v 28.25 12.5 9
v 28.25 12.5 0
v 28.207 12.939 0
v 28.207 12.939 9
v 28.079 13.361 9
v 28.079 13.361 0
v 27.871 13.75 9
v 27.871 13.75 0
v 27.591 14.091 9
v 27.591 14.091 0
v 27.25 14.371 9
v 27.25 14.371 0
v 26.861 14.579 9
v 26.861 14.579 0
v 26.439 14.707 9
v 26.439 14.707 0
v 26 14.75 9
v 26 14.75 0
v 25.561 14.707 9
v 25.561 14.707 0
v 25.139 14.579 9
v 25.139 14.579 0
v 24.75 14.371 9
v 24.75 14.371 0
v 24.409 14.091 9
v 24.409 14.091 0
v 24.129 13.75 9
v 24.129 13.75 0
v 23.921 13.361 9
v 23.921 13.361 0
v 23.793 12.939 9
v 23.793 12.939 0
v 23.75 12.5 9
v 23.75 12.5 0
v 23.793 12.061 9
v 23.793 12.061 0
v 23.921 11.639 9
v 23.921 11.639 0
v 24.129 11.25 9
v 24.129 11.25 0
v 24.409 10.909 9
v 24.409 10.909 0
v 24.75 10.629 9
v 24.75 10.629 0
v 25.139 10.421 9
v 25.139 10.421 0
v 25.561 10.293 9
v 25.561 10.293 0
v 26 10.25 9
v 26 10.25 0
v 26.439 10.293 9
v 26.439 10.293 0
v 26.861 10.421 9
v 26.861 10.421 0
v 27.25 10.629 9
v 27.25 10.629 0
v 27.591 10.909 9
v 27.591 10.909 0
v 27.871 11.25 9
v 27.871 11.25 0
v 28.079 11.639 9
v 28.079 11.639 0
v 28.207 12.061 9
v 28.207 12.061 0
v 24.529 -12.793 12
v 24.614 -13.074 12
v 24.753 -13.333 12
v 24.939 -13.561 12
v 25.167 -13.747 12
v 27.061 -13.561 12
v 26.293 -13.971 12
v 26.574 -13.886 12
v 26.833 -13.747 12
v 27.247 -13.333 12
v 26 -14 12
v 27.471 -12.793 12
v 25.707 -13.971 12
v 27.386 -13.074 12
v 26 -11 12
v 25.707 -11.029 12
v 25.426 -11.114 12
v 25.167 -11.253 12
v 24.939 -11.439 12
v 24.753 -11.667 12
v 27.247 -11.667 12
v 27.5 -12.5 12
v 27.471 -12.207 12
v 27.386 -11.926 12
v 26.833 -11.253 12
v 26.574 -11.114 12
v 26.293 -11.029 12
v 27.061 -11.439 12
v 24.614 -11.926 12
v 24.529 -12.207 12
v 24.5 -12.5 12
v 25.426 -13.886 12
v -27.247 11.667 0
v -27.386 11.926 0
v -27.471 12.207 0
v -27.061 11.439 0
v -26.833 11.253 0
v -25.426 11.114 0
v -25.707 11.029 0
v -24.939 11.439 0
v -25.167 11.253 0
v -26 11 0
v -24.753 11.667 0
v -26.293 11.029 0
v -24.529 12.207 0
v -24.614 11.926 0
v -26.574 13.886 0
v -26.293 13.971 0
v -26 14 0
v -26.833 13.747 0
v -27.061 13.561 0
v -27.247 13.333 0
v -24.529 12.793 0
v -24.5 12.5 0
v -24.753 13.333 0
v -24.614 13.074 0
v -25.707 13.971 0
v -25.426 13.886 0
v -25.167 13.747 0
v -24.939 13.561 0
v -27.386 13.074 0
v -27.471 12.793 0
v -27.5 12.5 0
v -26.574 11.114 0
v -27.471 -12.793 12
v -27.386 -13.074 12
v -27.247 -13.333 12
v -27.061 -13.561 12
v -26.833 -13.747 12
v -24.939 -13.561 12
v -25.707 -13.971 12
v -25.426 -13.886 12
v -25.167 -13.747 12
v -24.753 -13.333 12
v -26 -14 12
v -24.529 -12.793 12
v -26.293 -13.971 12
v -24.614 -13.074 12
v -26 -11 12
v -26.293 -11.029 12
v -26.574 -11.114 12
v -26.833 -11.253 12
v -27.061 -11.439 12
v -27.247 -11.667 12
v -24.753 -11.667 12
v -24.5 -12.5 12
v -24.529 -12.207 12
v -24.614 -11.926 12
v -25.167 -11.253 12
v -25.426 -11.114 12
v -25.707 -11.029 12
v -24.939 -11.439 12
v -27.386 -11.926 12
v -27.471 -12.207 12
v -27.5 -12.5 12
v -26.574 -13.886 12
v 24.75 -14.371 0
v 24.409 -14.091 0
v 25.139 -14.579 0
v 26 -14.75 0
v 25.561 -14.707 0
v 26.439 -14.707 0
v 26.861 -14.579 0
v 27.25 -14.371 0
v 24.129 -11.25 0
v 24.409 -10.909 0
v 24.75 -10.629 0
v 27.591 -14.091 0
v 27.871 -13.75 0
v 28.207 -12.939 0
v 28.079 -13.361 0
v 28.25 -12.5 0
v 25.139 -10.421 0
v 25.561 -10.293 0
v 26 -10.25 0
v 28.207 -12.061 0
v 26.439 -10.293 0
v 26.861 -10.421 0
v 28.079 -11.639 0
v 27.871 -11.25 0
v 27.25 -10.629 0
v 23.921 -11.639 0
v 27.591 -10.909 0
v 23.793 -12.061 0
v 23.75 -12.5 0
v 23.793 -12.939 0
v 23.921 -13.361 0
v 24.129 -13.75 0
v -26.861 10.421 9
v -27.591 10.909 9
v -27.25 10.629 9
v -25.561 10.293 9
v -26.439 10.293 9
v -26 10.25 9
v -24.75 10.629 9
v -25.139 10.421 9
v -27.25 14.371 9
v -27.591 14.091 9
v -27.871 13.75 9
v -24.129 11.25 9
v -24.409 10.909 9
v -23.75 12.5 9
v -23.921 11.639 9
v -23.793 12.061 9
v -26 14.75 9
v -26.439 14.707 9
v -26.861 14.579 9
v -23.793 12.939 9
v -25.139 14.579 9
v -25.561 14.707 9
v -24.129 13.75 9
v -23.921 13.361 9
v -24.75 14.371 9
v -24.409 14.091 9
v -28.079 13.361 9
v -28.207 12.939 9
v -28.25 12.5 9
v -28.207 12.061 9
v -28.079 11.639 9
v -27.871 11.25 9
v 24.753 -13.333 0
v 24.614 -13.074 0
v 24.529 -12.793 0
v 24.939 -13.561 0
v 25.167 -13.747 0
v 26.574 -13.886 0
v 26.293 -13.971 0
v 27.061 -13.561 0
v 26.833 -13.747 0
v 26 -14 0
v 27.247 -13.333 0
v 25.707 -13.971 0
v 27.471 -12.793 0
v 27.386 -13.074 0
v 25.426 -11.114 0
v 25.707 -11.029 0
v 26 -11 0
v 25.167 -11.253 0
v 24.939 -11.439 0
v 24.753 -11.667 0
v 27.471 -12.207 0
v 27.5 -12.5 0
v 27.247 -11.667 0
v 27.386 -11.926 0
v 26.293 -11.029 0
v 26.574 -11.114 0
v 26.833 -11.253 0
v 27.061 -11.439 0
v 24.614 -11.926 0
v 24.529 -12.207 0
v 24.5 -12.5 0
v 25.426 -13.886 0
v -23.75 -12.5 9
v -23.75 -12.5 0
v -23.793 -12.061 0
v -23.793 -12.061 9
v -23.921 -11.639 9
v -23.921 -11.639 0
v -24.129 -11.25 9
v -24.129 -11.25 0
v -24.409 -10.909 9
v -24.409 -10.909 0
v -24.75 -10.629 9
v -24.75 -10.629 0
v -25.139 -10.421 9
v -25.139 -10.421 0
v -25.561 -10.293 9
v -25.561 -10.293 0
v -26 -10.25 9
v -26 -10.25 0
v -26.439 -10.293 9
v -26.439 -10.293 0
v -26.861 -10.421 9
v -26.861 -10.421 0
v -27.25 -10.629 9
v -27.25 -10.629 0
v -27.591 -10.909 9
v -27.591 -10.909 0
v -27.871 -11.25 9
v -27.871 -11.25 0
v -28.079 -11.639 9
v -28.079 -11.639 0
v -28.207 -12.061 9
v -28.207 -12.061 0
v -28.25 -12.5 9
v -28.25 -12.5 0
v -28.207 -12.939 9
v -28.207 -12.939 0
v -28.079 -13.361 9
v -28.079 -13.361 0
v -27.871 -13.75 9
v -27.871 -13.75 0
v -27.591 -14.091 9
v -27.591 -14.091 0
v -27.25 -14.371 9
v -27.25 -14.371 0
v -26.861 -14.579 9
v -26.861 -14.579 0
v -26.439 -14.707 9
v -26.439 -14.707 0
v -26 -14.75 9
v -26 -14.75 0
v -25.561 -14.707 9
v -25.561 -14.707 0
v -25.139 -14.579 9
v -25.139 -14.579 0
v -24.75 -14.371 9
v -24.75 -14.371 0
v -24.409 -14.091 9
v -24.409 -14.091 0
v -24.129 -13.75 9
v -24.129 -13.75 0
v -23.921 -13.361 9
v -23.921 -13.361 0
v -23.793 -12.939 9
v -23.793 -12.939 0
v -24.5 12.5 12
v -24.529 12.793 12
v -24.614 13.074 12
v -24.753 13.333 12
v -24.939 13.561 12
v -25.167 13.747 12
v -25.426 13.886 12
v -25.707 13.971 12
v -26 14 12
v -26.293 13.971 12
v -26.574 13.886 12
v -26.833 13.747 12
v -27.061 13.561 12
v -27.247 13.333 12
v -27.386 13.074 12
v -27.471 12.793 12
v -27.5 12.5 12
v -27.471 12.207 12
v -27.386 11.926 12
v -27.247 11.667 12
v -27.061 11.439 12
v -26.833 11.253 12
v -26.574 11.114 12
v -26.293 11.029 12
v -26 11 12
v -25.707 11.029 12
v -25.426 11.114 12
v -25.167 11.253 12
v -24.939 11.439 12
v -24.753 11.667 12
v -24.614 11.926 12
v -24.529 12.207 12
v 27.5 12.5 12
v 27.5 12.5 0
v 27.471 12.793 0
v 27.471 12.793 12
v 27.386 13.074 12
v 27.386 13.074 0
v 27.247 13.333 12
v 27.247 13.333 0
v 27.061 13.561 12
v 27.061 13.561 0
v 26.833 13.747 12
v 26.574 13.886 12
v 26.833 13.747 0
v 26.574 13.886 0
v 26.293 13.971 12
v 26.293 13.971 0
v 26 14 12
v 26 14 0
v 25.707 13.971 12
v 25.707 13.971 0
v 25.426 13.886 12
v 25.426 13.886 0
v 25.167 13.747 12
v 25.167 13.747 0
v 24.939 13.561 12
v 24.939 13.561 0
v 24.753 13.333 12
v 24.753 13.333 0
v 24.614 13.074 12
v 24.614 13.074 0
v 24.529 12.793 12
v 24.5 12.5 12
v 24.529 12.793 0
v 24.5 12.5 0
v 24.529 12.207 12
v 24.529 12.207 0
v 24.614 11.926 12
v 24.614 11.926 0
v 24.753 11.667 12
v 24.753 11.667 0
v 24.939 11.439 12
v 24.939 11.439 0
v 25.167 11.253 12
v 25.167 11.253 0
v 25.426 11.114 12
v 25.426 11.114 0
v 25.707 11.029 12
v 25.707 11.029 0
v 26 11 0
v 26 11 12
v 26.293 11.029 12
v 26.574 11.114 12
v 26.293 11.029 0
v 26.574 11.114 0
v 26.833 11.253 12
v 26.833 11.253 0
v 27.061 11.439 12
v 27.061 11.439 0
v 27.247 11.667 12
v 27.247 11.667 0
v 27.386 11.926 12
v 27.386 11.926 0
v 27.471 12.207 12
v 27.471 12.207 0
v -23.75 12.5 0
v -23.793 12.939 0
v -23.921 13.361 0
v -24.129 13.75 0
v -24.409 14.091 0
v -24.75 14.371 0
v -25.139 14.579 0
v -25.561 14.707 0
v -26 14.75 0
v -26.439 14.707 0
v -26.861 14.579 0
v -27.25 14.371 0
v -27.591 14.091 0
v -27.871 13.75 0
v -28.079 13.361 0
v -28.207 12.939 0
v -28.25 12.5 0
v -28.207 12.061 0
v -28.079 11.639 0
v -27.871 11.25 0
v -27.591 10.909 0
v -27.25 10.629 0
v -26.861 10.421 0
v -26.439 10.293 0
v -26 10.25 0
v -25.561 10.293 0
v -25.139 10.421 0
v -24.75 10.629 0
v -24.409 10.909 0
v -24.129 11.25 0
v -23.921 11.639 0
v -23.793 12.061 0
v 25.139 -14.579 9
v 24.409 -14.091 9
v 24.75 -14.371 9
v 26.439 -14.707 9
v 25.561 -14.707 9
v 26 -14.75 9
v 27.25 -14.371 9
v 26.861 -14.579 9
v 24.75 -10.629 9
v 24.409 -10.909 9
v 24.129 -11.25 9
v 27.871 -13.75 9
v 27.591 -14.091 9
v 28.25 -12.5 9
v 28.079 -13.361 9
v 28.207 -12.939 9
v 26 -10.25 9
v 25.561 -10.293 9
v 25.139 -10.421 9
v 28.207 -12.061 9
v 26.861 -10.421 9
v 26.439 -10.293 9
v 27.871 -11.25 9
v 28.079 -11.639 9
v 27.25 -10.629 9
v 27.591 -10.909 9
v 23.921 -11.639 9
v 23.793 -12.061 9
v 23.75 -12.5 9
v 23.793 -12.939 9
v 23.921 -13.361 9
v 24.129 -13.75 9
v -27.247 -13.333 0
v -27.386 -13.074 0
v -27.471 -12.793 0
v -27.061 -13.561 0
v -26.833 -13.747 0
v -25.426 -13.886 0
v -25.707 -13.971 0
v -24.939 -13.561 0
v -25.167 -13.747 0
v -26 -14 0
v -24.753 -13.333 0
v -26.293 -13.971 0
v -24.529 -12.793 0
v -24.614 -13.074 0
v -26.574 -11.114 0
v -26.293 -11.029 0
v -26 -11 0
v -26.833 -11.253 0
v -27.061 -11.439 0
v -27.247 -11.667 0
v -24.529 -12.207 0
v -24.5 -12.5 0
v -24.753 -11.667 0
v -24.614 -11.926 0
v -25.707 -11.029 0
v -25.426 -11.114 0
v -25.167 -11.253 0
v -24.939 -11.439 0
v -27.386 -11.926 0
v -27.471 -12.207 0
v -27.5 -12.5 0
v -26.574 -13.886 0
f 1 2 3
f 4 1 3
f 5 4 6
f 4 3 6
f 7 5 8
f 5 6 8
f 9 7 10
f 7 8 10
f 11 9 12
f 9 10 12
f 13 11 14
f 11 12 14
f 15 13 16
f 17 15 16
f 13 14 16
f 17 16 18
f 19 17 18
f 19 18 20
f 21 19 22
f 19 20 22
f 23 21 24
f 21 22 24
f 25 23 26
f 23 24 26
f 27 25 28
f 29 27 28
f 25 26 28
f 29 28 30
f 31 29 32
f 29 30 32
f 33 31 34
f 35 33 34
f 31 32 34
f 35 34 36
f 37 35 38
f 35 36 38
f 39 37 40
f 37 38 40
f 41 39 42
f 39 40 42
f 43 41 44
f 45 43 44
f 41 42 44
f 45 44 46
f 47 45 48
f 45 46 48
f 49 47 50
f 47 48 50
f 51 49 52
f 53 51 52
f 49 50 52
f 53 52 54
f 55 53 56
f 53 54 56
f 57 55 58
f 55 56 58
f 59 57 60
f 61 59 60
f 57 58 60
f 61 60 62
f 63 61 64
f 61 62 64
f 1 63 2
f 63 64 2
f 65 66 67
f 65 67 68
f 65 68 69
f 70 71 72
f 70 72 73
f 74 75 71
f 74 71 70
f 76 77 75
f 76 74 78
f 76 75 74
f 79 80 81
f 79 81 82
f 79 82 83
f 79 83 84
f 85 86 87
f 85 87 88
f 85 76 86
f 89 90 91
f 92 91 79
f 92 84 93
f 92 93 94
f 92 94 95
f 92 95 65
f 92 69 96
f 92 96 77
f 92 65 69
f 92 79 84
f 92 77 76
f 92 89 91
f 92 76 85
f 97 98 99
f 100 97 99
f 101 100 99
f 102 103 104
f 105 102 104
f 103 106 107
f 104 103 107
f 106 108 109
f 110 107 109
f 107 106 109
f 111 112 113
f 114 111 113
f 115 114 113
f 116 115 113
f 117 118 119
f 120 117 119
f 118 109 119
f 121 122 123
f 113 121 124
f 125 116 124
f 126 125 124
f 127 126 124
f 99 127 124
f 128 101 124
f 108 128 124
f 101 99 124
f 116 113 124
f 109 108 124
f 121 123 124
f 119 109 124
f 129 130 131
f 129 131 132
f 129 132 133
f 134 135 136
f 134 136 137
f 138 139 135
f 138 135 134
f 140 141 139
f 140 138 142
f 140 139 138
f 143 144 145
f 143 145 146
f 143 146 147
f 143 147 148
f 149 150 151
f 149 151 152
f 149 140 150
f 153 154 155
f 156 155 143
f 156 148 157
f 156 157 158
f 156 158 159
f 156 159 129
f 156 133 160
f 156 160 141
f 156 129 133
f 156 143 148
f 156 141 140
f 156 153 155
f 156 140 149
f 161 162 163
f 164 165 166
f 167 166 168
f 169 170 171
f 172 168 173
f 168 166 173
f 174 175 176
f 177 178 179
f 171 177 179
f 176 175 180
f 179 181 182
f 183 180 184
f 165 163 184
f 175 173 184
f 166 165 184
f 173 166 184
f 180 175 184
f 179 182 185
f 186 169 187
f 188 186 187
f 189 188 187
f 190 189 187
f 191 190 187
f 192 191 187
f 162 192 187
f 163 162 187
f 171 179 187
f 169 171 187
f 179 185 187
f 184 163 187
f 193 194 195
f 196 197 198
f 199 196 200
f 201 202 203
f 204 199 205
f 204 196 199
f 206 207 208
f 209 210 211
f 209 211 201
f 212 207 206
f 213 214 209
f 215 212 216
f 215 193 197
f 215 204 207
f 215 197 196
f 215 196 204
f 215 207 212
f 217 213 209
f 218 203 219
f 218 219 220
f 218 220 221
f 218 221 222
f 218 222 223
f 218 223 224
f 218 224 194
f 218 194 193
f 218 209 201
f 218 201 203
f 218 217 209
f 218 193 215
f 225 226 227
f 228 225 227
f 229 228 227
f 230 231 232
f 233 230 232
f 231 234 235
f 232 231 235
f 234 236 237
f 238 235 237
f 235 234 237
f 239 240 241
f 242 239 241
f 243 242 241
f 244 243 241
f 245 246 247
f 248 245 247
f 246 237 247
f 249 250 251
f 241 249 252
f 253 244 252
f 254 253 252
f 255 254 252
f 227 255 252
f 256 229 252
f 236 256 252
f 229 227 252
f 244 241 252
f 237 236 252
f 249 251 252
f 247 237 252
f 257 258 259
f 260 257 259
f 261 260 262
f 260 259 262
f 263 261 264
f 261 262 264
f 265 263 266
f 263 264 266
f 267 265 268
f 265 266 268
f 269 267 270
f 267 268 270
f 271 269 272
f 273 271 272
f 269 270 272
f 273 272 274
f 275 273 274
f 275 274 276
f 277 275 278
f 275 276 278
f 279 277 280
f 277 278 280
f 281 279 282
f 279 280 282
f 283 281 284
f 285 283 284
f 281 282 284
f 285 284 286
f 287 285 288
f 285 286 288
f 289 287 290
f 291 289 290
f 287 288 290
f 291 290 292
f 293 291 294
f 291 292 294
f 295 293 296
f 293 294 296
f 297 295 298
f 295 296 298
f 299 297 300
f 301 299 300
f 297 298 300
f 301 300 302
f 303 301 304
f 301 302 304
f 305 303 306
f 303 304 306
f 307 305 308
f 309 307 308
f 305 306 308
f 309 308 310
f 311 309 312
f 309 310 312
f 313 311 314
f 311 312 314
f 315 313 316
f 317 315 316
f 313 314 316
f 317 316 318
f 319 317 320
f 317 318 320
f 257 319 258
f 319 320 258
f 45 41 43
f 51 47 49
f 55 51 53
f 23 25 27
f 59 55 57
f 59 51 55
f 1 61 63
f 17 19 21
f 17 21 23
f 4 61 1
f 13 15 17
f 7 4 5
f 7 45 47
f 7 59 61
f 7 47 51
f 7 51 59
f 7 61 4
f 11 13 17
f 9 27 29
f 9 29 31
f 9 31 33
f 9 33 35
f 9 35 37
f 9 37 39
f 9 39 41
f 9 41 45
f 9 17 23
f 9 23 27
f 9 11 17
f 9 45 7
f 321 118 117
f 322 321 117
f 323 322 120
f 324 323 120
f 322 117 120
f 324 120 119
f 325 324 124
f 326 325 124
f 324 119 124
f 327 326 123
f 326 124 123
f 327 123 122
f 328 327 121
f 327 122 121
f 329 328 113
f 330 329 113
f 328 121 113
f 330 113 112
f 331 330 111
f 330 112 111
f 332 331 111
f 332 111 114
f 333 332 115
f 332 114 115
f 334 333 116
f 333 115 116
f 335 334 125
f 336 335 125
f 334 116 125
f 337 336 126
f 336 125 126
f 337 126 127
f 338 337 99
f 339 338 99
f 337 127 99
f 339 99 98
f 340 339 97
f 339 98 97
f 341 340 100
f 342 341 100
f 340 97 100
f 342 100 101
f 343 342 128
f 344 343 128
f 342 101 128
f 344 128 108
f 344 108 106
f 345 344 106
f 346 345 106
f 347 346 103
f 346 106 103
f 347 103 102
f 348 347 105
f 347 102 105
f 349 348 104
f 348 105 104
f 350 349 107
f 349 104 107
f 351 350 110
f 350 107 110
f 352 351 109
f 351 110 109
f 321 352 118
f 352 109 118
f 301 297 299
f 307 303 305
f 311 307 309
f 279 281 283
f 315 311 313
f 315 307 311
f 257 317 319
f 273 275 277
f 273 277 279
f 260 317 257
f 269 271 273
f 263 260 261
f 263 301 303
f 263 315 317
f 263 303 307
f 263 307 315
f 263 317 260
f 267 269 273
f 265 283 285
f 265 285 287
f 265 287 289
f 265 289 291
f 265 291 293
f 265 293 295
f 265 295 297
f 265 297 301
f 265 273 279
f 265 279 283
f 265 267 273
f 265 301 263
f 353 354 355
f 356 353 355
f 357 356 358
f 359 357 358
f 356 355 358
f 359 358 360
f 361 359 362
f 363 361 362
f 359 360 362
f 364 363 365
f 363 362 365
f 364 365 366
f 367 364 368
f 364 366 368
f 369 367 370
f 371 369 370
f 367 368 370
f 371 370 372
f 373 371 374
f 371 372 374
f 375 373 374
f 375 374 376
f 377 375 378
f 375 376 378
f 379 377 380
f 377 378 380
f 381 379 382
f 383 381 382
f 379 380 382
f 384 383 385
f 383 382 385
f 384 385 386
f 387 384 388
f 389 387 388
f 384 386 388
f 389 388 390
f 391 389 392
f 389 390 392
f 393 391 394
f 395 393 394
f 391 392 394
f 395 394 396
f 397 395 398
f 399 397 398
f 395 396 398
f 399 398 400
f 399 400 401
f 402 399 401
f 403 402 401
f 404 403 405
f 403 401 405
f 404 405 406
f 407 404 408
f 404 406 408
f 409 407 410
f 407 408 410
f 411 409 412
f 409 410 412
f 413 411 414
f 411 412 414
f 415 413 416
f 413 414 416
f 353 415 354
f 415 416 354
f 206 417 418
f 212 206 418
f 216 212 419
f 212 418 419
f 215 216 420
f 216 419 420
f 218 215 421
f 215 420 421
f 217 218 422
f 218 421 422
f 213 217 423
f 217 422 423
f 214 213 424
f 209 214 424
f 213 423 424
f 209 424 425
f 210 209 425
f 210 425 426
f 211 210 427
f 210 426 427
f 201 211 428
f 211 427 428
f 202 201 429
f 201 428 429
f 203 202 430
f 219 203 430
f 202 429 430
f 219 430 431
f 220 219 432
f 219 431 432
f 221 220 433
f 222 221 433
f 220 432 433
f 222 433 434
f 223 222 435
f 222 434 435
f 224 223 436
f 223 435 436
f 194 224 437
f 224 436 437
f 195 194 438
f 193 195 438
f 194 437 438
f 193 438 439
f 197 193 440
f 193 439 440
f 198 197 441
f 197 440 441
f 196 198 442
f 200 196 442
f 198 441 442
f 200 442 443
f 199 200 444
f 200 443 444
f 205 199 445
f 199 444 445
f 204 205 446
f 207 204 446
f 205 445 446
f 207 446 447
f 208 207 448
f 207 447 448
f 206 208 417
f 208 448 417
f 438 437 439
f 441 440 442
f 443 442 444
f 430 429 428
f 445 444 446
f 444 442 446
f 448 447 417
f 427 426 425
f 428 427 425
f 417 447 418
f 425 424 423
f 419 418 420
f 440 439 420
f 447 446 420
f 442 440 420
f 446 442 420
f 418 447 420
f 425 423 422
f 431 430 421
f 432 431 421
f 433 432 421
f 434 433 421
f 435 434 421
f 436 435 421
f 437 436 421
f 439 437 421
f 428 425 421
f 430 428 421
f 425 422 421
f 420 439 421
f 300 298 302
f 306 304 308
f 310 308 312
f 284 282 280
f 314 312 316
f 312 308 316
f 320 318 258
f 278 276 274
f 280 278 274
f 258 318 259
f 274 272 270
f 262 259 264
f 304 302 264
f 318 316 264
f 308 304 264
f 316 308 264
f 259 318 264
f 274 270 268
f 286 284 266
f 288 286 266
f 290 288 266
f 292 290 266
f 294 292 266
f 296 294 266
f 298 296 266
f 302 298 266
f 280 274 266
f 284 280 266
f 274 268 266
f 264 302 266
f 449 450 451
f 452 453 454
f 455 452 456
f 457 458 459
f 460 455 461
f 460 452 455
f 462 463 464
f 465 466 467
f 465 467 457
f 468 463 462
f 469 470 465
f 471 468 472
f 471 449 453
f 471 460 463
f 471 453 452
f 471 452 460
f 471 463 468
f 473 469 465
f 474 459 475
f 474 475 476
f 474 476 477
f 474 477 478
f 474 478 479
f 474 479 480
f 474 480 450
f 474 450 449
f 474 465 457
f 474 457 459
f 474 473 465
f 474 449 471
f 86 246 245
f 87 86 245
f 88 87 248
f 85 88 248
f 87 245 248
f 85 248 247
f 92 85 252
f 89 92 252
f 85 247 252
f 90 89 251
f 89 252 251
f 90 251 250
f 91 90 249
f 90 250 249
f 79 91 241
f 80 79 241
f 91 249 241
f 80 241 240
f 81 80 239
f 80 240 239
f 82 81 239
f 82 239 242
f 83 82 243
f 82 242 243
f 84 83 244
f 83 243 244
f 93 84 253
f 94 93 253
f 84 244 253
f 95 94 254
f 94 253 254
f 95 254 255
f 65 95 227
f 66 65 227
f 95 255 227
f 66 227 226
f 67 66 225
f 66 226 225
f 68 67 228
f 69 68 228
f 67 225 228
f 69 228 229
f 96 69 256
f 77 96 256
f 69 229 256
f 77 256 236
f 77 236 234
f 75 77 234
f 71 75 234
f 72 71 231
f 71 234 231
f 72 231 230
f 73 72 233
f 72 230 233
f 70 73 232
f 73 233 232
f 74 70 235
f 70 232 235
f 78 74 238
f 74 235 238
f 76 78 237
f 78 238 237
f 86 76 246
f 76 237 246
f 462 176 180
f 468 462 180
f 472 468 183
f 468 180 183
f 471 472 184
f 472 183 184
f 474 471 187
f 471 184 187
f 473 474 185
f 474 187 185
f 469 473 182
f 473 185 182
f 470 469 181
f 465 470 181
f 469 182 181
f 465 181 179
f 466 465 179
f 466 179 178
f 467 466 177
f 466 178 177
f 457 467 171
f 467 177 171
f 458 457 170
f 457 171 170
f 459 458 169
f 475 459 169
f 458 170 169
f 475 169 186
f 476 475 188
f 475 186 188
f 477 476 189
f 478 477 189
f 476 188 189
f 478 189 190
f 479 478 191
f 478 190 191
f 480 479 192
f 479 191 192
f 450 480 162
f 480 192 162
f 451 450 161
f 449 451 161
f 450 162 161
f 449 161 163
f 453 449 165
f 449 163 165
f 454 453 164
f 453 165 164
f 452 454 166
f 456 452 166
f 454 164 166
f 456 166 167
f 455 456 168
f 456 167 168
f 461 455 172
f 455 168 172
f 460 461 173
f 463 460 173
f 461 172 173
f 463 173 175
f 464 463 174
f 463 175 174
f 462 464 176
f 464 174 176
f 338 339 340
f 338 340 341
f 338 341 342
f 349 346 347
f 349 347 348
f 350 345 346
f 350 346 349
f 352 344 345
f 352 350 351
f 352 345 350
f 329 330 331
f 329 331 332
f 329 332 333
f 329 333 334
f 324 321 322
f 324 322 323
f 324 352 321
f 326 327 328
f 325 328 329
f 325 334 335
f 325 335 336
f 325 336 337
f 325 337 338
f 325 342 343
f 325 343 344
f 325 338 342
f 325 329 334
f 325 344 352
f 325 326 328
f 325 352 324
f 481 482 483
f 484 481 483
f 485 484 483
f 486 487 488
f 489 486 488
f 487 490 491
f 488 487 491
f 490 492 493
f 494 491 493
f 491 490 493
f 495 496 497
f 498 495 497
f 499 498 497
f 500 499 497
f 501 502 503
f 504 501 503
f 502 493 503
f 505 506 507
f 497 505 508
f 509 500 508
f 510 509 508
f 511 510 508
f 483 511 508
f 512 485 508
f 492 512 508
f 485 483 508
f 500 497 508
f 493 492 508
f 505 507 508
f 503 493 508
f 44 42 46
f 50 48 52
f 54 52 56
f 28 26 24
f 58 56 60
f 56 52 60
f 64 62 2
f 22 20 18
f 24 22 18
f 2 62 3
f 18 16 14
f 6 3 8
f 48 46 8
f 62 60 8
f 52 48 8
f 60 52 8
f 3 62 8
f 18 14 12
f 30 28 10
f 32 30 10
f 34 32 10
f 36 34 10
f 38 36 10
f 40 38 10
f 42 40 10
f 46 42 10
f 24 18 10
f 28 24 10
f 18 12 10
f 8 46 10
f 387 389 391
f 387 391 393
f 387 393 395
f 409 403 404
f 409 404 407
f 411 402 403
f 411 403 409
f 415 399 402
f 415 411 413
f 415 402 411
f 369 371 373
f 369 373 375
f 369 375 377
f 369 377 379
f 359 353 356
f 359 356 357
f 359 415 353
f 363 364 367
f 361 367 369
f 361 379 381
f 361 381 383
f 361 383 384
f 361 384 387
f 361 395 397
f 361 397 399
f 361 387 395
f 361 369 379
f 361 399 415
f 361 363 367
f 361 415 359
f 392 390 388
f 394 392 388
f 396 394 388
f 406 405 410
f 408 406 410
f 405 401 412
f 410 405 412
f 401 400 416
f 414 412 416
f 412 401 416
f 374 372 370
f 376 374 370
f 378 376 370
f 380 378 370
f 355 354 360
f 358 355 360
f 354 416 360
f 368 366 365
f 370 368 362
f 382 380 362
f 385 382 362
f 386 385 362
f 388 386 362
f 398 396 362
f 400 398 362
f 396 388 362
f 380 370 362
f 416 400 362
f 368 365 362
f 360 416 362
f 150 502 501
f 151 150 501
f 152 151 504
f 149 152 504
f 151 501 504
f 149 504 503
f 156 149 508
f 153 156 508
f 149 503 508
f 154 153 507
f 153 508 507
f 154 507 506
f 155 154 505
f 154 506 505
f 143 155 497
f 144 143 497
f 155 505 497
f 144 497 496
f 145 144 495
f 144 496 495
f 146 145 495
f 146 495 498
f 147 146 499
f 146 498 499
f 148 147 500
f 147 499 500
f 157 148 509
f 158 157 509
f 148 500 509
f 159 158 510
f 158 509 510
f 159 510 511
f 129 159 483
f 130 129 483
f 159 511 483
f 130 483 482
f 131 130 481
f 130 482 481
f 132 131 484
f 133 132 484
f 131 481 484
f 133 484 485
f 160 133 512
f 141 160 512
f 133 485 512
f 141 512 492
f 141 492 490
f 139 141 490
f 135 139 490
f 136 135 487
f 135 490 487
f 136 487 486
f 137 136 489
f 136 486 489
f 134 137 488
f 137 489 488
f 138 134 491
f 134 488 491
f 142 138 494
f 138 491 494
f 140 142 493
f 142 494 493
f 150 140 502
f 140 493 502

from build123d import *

# Parameters (mm, degrees)
SKETCH001_R  = 2.25
PAD_DEPTH    = 9
SKETCH_R     = 1.5
PAD001_DEPTH = 12


with BuildPart() as pad_mounting_pads:
    # Sketch001 → Pad (new body)
    with BuildSketch(Plane.XY):
        with Locations((-26, 12.5)):
            Circle(SKETCH001_R)
        with Locations((-26, -12.5)):
            Circle(SKETCH001_R)
        with Locations((26, 12.5)):
            Circle(SKETCH001_R)
        with Locations((26, -12.5)):
            Circle(SKETCH001_R)
    extrude(amount=PAD_DEPTH)


with BuildPart() as pad_mounting_posts:
    # Sketch → Pad001 (new body)
    with BuildSketch(Plane.XY):
        with Locations((-26, 12.5)):
            Circle(SKETCH_R)
        with Locations((-26, -12.5)):
            Circle(SKETCH_R)
        with Locations((26, 12.5)):
            Circle(SKETCH_R)
        with Locations((26, -12.5)):
            Circle(SKETCH_R)
    extrude(amount=PAD001_DEPTH)


solid = Compound([pad_mounting_pads.part, pad_mounting_posts.part])
